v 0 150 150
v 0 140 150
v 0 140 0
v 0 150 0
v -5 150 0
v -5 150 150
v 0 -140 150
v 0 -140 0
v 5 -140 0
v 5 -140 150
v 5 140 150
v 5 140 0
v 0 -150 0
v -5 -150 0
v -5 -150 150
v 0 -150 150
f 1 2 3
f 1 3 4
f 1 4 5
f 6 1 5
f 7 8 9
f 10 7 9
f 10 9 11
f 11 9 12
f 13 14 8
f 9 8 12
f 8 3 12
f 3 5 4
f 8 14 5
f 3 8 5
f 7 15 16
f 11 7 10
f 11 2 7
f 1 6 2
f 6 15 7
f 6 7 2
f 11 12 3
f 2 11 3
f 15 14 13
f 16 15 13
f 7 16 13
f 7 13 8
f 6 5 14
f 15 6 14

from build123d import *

# Parameters (mm, degrees)
F1_DEPTH = 150
F4_DEPTH = 150


with BuildPart() as f1:
    # F0 (on Top) → F1 (new body)
    with BuildSketch(Plane.XY):
        Polygon((0, 75), (-6, 75), (-6, -75), (0, -75), (0, -63), (6, -63), (6, 63), (0, 63), align=None)
    extrude(amount=F1_DEPTH)


with BuildPart() as f4:
    # F3 (on Top) → F4 (new body)
    with BuildSketch(Plane.XY):
        Polygon((0, 140), (0, 150), (-5, 150), (-5, -150), (0, -150), (0, -140), (5, -140), (5, 140), align=None)
    extrude(amount=F4_DEPTH)


solid = f4.part
